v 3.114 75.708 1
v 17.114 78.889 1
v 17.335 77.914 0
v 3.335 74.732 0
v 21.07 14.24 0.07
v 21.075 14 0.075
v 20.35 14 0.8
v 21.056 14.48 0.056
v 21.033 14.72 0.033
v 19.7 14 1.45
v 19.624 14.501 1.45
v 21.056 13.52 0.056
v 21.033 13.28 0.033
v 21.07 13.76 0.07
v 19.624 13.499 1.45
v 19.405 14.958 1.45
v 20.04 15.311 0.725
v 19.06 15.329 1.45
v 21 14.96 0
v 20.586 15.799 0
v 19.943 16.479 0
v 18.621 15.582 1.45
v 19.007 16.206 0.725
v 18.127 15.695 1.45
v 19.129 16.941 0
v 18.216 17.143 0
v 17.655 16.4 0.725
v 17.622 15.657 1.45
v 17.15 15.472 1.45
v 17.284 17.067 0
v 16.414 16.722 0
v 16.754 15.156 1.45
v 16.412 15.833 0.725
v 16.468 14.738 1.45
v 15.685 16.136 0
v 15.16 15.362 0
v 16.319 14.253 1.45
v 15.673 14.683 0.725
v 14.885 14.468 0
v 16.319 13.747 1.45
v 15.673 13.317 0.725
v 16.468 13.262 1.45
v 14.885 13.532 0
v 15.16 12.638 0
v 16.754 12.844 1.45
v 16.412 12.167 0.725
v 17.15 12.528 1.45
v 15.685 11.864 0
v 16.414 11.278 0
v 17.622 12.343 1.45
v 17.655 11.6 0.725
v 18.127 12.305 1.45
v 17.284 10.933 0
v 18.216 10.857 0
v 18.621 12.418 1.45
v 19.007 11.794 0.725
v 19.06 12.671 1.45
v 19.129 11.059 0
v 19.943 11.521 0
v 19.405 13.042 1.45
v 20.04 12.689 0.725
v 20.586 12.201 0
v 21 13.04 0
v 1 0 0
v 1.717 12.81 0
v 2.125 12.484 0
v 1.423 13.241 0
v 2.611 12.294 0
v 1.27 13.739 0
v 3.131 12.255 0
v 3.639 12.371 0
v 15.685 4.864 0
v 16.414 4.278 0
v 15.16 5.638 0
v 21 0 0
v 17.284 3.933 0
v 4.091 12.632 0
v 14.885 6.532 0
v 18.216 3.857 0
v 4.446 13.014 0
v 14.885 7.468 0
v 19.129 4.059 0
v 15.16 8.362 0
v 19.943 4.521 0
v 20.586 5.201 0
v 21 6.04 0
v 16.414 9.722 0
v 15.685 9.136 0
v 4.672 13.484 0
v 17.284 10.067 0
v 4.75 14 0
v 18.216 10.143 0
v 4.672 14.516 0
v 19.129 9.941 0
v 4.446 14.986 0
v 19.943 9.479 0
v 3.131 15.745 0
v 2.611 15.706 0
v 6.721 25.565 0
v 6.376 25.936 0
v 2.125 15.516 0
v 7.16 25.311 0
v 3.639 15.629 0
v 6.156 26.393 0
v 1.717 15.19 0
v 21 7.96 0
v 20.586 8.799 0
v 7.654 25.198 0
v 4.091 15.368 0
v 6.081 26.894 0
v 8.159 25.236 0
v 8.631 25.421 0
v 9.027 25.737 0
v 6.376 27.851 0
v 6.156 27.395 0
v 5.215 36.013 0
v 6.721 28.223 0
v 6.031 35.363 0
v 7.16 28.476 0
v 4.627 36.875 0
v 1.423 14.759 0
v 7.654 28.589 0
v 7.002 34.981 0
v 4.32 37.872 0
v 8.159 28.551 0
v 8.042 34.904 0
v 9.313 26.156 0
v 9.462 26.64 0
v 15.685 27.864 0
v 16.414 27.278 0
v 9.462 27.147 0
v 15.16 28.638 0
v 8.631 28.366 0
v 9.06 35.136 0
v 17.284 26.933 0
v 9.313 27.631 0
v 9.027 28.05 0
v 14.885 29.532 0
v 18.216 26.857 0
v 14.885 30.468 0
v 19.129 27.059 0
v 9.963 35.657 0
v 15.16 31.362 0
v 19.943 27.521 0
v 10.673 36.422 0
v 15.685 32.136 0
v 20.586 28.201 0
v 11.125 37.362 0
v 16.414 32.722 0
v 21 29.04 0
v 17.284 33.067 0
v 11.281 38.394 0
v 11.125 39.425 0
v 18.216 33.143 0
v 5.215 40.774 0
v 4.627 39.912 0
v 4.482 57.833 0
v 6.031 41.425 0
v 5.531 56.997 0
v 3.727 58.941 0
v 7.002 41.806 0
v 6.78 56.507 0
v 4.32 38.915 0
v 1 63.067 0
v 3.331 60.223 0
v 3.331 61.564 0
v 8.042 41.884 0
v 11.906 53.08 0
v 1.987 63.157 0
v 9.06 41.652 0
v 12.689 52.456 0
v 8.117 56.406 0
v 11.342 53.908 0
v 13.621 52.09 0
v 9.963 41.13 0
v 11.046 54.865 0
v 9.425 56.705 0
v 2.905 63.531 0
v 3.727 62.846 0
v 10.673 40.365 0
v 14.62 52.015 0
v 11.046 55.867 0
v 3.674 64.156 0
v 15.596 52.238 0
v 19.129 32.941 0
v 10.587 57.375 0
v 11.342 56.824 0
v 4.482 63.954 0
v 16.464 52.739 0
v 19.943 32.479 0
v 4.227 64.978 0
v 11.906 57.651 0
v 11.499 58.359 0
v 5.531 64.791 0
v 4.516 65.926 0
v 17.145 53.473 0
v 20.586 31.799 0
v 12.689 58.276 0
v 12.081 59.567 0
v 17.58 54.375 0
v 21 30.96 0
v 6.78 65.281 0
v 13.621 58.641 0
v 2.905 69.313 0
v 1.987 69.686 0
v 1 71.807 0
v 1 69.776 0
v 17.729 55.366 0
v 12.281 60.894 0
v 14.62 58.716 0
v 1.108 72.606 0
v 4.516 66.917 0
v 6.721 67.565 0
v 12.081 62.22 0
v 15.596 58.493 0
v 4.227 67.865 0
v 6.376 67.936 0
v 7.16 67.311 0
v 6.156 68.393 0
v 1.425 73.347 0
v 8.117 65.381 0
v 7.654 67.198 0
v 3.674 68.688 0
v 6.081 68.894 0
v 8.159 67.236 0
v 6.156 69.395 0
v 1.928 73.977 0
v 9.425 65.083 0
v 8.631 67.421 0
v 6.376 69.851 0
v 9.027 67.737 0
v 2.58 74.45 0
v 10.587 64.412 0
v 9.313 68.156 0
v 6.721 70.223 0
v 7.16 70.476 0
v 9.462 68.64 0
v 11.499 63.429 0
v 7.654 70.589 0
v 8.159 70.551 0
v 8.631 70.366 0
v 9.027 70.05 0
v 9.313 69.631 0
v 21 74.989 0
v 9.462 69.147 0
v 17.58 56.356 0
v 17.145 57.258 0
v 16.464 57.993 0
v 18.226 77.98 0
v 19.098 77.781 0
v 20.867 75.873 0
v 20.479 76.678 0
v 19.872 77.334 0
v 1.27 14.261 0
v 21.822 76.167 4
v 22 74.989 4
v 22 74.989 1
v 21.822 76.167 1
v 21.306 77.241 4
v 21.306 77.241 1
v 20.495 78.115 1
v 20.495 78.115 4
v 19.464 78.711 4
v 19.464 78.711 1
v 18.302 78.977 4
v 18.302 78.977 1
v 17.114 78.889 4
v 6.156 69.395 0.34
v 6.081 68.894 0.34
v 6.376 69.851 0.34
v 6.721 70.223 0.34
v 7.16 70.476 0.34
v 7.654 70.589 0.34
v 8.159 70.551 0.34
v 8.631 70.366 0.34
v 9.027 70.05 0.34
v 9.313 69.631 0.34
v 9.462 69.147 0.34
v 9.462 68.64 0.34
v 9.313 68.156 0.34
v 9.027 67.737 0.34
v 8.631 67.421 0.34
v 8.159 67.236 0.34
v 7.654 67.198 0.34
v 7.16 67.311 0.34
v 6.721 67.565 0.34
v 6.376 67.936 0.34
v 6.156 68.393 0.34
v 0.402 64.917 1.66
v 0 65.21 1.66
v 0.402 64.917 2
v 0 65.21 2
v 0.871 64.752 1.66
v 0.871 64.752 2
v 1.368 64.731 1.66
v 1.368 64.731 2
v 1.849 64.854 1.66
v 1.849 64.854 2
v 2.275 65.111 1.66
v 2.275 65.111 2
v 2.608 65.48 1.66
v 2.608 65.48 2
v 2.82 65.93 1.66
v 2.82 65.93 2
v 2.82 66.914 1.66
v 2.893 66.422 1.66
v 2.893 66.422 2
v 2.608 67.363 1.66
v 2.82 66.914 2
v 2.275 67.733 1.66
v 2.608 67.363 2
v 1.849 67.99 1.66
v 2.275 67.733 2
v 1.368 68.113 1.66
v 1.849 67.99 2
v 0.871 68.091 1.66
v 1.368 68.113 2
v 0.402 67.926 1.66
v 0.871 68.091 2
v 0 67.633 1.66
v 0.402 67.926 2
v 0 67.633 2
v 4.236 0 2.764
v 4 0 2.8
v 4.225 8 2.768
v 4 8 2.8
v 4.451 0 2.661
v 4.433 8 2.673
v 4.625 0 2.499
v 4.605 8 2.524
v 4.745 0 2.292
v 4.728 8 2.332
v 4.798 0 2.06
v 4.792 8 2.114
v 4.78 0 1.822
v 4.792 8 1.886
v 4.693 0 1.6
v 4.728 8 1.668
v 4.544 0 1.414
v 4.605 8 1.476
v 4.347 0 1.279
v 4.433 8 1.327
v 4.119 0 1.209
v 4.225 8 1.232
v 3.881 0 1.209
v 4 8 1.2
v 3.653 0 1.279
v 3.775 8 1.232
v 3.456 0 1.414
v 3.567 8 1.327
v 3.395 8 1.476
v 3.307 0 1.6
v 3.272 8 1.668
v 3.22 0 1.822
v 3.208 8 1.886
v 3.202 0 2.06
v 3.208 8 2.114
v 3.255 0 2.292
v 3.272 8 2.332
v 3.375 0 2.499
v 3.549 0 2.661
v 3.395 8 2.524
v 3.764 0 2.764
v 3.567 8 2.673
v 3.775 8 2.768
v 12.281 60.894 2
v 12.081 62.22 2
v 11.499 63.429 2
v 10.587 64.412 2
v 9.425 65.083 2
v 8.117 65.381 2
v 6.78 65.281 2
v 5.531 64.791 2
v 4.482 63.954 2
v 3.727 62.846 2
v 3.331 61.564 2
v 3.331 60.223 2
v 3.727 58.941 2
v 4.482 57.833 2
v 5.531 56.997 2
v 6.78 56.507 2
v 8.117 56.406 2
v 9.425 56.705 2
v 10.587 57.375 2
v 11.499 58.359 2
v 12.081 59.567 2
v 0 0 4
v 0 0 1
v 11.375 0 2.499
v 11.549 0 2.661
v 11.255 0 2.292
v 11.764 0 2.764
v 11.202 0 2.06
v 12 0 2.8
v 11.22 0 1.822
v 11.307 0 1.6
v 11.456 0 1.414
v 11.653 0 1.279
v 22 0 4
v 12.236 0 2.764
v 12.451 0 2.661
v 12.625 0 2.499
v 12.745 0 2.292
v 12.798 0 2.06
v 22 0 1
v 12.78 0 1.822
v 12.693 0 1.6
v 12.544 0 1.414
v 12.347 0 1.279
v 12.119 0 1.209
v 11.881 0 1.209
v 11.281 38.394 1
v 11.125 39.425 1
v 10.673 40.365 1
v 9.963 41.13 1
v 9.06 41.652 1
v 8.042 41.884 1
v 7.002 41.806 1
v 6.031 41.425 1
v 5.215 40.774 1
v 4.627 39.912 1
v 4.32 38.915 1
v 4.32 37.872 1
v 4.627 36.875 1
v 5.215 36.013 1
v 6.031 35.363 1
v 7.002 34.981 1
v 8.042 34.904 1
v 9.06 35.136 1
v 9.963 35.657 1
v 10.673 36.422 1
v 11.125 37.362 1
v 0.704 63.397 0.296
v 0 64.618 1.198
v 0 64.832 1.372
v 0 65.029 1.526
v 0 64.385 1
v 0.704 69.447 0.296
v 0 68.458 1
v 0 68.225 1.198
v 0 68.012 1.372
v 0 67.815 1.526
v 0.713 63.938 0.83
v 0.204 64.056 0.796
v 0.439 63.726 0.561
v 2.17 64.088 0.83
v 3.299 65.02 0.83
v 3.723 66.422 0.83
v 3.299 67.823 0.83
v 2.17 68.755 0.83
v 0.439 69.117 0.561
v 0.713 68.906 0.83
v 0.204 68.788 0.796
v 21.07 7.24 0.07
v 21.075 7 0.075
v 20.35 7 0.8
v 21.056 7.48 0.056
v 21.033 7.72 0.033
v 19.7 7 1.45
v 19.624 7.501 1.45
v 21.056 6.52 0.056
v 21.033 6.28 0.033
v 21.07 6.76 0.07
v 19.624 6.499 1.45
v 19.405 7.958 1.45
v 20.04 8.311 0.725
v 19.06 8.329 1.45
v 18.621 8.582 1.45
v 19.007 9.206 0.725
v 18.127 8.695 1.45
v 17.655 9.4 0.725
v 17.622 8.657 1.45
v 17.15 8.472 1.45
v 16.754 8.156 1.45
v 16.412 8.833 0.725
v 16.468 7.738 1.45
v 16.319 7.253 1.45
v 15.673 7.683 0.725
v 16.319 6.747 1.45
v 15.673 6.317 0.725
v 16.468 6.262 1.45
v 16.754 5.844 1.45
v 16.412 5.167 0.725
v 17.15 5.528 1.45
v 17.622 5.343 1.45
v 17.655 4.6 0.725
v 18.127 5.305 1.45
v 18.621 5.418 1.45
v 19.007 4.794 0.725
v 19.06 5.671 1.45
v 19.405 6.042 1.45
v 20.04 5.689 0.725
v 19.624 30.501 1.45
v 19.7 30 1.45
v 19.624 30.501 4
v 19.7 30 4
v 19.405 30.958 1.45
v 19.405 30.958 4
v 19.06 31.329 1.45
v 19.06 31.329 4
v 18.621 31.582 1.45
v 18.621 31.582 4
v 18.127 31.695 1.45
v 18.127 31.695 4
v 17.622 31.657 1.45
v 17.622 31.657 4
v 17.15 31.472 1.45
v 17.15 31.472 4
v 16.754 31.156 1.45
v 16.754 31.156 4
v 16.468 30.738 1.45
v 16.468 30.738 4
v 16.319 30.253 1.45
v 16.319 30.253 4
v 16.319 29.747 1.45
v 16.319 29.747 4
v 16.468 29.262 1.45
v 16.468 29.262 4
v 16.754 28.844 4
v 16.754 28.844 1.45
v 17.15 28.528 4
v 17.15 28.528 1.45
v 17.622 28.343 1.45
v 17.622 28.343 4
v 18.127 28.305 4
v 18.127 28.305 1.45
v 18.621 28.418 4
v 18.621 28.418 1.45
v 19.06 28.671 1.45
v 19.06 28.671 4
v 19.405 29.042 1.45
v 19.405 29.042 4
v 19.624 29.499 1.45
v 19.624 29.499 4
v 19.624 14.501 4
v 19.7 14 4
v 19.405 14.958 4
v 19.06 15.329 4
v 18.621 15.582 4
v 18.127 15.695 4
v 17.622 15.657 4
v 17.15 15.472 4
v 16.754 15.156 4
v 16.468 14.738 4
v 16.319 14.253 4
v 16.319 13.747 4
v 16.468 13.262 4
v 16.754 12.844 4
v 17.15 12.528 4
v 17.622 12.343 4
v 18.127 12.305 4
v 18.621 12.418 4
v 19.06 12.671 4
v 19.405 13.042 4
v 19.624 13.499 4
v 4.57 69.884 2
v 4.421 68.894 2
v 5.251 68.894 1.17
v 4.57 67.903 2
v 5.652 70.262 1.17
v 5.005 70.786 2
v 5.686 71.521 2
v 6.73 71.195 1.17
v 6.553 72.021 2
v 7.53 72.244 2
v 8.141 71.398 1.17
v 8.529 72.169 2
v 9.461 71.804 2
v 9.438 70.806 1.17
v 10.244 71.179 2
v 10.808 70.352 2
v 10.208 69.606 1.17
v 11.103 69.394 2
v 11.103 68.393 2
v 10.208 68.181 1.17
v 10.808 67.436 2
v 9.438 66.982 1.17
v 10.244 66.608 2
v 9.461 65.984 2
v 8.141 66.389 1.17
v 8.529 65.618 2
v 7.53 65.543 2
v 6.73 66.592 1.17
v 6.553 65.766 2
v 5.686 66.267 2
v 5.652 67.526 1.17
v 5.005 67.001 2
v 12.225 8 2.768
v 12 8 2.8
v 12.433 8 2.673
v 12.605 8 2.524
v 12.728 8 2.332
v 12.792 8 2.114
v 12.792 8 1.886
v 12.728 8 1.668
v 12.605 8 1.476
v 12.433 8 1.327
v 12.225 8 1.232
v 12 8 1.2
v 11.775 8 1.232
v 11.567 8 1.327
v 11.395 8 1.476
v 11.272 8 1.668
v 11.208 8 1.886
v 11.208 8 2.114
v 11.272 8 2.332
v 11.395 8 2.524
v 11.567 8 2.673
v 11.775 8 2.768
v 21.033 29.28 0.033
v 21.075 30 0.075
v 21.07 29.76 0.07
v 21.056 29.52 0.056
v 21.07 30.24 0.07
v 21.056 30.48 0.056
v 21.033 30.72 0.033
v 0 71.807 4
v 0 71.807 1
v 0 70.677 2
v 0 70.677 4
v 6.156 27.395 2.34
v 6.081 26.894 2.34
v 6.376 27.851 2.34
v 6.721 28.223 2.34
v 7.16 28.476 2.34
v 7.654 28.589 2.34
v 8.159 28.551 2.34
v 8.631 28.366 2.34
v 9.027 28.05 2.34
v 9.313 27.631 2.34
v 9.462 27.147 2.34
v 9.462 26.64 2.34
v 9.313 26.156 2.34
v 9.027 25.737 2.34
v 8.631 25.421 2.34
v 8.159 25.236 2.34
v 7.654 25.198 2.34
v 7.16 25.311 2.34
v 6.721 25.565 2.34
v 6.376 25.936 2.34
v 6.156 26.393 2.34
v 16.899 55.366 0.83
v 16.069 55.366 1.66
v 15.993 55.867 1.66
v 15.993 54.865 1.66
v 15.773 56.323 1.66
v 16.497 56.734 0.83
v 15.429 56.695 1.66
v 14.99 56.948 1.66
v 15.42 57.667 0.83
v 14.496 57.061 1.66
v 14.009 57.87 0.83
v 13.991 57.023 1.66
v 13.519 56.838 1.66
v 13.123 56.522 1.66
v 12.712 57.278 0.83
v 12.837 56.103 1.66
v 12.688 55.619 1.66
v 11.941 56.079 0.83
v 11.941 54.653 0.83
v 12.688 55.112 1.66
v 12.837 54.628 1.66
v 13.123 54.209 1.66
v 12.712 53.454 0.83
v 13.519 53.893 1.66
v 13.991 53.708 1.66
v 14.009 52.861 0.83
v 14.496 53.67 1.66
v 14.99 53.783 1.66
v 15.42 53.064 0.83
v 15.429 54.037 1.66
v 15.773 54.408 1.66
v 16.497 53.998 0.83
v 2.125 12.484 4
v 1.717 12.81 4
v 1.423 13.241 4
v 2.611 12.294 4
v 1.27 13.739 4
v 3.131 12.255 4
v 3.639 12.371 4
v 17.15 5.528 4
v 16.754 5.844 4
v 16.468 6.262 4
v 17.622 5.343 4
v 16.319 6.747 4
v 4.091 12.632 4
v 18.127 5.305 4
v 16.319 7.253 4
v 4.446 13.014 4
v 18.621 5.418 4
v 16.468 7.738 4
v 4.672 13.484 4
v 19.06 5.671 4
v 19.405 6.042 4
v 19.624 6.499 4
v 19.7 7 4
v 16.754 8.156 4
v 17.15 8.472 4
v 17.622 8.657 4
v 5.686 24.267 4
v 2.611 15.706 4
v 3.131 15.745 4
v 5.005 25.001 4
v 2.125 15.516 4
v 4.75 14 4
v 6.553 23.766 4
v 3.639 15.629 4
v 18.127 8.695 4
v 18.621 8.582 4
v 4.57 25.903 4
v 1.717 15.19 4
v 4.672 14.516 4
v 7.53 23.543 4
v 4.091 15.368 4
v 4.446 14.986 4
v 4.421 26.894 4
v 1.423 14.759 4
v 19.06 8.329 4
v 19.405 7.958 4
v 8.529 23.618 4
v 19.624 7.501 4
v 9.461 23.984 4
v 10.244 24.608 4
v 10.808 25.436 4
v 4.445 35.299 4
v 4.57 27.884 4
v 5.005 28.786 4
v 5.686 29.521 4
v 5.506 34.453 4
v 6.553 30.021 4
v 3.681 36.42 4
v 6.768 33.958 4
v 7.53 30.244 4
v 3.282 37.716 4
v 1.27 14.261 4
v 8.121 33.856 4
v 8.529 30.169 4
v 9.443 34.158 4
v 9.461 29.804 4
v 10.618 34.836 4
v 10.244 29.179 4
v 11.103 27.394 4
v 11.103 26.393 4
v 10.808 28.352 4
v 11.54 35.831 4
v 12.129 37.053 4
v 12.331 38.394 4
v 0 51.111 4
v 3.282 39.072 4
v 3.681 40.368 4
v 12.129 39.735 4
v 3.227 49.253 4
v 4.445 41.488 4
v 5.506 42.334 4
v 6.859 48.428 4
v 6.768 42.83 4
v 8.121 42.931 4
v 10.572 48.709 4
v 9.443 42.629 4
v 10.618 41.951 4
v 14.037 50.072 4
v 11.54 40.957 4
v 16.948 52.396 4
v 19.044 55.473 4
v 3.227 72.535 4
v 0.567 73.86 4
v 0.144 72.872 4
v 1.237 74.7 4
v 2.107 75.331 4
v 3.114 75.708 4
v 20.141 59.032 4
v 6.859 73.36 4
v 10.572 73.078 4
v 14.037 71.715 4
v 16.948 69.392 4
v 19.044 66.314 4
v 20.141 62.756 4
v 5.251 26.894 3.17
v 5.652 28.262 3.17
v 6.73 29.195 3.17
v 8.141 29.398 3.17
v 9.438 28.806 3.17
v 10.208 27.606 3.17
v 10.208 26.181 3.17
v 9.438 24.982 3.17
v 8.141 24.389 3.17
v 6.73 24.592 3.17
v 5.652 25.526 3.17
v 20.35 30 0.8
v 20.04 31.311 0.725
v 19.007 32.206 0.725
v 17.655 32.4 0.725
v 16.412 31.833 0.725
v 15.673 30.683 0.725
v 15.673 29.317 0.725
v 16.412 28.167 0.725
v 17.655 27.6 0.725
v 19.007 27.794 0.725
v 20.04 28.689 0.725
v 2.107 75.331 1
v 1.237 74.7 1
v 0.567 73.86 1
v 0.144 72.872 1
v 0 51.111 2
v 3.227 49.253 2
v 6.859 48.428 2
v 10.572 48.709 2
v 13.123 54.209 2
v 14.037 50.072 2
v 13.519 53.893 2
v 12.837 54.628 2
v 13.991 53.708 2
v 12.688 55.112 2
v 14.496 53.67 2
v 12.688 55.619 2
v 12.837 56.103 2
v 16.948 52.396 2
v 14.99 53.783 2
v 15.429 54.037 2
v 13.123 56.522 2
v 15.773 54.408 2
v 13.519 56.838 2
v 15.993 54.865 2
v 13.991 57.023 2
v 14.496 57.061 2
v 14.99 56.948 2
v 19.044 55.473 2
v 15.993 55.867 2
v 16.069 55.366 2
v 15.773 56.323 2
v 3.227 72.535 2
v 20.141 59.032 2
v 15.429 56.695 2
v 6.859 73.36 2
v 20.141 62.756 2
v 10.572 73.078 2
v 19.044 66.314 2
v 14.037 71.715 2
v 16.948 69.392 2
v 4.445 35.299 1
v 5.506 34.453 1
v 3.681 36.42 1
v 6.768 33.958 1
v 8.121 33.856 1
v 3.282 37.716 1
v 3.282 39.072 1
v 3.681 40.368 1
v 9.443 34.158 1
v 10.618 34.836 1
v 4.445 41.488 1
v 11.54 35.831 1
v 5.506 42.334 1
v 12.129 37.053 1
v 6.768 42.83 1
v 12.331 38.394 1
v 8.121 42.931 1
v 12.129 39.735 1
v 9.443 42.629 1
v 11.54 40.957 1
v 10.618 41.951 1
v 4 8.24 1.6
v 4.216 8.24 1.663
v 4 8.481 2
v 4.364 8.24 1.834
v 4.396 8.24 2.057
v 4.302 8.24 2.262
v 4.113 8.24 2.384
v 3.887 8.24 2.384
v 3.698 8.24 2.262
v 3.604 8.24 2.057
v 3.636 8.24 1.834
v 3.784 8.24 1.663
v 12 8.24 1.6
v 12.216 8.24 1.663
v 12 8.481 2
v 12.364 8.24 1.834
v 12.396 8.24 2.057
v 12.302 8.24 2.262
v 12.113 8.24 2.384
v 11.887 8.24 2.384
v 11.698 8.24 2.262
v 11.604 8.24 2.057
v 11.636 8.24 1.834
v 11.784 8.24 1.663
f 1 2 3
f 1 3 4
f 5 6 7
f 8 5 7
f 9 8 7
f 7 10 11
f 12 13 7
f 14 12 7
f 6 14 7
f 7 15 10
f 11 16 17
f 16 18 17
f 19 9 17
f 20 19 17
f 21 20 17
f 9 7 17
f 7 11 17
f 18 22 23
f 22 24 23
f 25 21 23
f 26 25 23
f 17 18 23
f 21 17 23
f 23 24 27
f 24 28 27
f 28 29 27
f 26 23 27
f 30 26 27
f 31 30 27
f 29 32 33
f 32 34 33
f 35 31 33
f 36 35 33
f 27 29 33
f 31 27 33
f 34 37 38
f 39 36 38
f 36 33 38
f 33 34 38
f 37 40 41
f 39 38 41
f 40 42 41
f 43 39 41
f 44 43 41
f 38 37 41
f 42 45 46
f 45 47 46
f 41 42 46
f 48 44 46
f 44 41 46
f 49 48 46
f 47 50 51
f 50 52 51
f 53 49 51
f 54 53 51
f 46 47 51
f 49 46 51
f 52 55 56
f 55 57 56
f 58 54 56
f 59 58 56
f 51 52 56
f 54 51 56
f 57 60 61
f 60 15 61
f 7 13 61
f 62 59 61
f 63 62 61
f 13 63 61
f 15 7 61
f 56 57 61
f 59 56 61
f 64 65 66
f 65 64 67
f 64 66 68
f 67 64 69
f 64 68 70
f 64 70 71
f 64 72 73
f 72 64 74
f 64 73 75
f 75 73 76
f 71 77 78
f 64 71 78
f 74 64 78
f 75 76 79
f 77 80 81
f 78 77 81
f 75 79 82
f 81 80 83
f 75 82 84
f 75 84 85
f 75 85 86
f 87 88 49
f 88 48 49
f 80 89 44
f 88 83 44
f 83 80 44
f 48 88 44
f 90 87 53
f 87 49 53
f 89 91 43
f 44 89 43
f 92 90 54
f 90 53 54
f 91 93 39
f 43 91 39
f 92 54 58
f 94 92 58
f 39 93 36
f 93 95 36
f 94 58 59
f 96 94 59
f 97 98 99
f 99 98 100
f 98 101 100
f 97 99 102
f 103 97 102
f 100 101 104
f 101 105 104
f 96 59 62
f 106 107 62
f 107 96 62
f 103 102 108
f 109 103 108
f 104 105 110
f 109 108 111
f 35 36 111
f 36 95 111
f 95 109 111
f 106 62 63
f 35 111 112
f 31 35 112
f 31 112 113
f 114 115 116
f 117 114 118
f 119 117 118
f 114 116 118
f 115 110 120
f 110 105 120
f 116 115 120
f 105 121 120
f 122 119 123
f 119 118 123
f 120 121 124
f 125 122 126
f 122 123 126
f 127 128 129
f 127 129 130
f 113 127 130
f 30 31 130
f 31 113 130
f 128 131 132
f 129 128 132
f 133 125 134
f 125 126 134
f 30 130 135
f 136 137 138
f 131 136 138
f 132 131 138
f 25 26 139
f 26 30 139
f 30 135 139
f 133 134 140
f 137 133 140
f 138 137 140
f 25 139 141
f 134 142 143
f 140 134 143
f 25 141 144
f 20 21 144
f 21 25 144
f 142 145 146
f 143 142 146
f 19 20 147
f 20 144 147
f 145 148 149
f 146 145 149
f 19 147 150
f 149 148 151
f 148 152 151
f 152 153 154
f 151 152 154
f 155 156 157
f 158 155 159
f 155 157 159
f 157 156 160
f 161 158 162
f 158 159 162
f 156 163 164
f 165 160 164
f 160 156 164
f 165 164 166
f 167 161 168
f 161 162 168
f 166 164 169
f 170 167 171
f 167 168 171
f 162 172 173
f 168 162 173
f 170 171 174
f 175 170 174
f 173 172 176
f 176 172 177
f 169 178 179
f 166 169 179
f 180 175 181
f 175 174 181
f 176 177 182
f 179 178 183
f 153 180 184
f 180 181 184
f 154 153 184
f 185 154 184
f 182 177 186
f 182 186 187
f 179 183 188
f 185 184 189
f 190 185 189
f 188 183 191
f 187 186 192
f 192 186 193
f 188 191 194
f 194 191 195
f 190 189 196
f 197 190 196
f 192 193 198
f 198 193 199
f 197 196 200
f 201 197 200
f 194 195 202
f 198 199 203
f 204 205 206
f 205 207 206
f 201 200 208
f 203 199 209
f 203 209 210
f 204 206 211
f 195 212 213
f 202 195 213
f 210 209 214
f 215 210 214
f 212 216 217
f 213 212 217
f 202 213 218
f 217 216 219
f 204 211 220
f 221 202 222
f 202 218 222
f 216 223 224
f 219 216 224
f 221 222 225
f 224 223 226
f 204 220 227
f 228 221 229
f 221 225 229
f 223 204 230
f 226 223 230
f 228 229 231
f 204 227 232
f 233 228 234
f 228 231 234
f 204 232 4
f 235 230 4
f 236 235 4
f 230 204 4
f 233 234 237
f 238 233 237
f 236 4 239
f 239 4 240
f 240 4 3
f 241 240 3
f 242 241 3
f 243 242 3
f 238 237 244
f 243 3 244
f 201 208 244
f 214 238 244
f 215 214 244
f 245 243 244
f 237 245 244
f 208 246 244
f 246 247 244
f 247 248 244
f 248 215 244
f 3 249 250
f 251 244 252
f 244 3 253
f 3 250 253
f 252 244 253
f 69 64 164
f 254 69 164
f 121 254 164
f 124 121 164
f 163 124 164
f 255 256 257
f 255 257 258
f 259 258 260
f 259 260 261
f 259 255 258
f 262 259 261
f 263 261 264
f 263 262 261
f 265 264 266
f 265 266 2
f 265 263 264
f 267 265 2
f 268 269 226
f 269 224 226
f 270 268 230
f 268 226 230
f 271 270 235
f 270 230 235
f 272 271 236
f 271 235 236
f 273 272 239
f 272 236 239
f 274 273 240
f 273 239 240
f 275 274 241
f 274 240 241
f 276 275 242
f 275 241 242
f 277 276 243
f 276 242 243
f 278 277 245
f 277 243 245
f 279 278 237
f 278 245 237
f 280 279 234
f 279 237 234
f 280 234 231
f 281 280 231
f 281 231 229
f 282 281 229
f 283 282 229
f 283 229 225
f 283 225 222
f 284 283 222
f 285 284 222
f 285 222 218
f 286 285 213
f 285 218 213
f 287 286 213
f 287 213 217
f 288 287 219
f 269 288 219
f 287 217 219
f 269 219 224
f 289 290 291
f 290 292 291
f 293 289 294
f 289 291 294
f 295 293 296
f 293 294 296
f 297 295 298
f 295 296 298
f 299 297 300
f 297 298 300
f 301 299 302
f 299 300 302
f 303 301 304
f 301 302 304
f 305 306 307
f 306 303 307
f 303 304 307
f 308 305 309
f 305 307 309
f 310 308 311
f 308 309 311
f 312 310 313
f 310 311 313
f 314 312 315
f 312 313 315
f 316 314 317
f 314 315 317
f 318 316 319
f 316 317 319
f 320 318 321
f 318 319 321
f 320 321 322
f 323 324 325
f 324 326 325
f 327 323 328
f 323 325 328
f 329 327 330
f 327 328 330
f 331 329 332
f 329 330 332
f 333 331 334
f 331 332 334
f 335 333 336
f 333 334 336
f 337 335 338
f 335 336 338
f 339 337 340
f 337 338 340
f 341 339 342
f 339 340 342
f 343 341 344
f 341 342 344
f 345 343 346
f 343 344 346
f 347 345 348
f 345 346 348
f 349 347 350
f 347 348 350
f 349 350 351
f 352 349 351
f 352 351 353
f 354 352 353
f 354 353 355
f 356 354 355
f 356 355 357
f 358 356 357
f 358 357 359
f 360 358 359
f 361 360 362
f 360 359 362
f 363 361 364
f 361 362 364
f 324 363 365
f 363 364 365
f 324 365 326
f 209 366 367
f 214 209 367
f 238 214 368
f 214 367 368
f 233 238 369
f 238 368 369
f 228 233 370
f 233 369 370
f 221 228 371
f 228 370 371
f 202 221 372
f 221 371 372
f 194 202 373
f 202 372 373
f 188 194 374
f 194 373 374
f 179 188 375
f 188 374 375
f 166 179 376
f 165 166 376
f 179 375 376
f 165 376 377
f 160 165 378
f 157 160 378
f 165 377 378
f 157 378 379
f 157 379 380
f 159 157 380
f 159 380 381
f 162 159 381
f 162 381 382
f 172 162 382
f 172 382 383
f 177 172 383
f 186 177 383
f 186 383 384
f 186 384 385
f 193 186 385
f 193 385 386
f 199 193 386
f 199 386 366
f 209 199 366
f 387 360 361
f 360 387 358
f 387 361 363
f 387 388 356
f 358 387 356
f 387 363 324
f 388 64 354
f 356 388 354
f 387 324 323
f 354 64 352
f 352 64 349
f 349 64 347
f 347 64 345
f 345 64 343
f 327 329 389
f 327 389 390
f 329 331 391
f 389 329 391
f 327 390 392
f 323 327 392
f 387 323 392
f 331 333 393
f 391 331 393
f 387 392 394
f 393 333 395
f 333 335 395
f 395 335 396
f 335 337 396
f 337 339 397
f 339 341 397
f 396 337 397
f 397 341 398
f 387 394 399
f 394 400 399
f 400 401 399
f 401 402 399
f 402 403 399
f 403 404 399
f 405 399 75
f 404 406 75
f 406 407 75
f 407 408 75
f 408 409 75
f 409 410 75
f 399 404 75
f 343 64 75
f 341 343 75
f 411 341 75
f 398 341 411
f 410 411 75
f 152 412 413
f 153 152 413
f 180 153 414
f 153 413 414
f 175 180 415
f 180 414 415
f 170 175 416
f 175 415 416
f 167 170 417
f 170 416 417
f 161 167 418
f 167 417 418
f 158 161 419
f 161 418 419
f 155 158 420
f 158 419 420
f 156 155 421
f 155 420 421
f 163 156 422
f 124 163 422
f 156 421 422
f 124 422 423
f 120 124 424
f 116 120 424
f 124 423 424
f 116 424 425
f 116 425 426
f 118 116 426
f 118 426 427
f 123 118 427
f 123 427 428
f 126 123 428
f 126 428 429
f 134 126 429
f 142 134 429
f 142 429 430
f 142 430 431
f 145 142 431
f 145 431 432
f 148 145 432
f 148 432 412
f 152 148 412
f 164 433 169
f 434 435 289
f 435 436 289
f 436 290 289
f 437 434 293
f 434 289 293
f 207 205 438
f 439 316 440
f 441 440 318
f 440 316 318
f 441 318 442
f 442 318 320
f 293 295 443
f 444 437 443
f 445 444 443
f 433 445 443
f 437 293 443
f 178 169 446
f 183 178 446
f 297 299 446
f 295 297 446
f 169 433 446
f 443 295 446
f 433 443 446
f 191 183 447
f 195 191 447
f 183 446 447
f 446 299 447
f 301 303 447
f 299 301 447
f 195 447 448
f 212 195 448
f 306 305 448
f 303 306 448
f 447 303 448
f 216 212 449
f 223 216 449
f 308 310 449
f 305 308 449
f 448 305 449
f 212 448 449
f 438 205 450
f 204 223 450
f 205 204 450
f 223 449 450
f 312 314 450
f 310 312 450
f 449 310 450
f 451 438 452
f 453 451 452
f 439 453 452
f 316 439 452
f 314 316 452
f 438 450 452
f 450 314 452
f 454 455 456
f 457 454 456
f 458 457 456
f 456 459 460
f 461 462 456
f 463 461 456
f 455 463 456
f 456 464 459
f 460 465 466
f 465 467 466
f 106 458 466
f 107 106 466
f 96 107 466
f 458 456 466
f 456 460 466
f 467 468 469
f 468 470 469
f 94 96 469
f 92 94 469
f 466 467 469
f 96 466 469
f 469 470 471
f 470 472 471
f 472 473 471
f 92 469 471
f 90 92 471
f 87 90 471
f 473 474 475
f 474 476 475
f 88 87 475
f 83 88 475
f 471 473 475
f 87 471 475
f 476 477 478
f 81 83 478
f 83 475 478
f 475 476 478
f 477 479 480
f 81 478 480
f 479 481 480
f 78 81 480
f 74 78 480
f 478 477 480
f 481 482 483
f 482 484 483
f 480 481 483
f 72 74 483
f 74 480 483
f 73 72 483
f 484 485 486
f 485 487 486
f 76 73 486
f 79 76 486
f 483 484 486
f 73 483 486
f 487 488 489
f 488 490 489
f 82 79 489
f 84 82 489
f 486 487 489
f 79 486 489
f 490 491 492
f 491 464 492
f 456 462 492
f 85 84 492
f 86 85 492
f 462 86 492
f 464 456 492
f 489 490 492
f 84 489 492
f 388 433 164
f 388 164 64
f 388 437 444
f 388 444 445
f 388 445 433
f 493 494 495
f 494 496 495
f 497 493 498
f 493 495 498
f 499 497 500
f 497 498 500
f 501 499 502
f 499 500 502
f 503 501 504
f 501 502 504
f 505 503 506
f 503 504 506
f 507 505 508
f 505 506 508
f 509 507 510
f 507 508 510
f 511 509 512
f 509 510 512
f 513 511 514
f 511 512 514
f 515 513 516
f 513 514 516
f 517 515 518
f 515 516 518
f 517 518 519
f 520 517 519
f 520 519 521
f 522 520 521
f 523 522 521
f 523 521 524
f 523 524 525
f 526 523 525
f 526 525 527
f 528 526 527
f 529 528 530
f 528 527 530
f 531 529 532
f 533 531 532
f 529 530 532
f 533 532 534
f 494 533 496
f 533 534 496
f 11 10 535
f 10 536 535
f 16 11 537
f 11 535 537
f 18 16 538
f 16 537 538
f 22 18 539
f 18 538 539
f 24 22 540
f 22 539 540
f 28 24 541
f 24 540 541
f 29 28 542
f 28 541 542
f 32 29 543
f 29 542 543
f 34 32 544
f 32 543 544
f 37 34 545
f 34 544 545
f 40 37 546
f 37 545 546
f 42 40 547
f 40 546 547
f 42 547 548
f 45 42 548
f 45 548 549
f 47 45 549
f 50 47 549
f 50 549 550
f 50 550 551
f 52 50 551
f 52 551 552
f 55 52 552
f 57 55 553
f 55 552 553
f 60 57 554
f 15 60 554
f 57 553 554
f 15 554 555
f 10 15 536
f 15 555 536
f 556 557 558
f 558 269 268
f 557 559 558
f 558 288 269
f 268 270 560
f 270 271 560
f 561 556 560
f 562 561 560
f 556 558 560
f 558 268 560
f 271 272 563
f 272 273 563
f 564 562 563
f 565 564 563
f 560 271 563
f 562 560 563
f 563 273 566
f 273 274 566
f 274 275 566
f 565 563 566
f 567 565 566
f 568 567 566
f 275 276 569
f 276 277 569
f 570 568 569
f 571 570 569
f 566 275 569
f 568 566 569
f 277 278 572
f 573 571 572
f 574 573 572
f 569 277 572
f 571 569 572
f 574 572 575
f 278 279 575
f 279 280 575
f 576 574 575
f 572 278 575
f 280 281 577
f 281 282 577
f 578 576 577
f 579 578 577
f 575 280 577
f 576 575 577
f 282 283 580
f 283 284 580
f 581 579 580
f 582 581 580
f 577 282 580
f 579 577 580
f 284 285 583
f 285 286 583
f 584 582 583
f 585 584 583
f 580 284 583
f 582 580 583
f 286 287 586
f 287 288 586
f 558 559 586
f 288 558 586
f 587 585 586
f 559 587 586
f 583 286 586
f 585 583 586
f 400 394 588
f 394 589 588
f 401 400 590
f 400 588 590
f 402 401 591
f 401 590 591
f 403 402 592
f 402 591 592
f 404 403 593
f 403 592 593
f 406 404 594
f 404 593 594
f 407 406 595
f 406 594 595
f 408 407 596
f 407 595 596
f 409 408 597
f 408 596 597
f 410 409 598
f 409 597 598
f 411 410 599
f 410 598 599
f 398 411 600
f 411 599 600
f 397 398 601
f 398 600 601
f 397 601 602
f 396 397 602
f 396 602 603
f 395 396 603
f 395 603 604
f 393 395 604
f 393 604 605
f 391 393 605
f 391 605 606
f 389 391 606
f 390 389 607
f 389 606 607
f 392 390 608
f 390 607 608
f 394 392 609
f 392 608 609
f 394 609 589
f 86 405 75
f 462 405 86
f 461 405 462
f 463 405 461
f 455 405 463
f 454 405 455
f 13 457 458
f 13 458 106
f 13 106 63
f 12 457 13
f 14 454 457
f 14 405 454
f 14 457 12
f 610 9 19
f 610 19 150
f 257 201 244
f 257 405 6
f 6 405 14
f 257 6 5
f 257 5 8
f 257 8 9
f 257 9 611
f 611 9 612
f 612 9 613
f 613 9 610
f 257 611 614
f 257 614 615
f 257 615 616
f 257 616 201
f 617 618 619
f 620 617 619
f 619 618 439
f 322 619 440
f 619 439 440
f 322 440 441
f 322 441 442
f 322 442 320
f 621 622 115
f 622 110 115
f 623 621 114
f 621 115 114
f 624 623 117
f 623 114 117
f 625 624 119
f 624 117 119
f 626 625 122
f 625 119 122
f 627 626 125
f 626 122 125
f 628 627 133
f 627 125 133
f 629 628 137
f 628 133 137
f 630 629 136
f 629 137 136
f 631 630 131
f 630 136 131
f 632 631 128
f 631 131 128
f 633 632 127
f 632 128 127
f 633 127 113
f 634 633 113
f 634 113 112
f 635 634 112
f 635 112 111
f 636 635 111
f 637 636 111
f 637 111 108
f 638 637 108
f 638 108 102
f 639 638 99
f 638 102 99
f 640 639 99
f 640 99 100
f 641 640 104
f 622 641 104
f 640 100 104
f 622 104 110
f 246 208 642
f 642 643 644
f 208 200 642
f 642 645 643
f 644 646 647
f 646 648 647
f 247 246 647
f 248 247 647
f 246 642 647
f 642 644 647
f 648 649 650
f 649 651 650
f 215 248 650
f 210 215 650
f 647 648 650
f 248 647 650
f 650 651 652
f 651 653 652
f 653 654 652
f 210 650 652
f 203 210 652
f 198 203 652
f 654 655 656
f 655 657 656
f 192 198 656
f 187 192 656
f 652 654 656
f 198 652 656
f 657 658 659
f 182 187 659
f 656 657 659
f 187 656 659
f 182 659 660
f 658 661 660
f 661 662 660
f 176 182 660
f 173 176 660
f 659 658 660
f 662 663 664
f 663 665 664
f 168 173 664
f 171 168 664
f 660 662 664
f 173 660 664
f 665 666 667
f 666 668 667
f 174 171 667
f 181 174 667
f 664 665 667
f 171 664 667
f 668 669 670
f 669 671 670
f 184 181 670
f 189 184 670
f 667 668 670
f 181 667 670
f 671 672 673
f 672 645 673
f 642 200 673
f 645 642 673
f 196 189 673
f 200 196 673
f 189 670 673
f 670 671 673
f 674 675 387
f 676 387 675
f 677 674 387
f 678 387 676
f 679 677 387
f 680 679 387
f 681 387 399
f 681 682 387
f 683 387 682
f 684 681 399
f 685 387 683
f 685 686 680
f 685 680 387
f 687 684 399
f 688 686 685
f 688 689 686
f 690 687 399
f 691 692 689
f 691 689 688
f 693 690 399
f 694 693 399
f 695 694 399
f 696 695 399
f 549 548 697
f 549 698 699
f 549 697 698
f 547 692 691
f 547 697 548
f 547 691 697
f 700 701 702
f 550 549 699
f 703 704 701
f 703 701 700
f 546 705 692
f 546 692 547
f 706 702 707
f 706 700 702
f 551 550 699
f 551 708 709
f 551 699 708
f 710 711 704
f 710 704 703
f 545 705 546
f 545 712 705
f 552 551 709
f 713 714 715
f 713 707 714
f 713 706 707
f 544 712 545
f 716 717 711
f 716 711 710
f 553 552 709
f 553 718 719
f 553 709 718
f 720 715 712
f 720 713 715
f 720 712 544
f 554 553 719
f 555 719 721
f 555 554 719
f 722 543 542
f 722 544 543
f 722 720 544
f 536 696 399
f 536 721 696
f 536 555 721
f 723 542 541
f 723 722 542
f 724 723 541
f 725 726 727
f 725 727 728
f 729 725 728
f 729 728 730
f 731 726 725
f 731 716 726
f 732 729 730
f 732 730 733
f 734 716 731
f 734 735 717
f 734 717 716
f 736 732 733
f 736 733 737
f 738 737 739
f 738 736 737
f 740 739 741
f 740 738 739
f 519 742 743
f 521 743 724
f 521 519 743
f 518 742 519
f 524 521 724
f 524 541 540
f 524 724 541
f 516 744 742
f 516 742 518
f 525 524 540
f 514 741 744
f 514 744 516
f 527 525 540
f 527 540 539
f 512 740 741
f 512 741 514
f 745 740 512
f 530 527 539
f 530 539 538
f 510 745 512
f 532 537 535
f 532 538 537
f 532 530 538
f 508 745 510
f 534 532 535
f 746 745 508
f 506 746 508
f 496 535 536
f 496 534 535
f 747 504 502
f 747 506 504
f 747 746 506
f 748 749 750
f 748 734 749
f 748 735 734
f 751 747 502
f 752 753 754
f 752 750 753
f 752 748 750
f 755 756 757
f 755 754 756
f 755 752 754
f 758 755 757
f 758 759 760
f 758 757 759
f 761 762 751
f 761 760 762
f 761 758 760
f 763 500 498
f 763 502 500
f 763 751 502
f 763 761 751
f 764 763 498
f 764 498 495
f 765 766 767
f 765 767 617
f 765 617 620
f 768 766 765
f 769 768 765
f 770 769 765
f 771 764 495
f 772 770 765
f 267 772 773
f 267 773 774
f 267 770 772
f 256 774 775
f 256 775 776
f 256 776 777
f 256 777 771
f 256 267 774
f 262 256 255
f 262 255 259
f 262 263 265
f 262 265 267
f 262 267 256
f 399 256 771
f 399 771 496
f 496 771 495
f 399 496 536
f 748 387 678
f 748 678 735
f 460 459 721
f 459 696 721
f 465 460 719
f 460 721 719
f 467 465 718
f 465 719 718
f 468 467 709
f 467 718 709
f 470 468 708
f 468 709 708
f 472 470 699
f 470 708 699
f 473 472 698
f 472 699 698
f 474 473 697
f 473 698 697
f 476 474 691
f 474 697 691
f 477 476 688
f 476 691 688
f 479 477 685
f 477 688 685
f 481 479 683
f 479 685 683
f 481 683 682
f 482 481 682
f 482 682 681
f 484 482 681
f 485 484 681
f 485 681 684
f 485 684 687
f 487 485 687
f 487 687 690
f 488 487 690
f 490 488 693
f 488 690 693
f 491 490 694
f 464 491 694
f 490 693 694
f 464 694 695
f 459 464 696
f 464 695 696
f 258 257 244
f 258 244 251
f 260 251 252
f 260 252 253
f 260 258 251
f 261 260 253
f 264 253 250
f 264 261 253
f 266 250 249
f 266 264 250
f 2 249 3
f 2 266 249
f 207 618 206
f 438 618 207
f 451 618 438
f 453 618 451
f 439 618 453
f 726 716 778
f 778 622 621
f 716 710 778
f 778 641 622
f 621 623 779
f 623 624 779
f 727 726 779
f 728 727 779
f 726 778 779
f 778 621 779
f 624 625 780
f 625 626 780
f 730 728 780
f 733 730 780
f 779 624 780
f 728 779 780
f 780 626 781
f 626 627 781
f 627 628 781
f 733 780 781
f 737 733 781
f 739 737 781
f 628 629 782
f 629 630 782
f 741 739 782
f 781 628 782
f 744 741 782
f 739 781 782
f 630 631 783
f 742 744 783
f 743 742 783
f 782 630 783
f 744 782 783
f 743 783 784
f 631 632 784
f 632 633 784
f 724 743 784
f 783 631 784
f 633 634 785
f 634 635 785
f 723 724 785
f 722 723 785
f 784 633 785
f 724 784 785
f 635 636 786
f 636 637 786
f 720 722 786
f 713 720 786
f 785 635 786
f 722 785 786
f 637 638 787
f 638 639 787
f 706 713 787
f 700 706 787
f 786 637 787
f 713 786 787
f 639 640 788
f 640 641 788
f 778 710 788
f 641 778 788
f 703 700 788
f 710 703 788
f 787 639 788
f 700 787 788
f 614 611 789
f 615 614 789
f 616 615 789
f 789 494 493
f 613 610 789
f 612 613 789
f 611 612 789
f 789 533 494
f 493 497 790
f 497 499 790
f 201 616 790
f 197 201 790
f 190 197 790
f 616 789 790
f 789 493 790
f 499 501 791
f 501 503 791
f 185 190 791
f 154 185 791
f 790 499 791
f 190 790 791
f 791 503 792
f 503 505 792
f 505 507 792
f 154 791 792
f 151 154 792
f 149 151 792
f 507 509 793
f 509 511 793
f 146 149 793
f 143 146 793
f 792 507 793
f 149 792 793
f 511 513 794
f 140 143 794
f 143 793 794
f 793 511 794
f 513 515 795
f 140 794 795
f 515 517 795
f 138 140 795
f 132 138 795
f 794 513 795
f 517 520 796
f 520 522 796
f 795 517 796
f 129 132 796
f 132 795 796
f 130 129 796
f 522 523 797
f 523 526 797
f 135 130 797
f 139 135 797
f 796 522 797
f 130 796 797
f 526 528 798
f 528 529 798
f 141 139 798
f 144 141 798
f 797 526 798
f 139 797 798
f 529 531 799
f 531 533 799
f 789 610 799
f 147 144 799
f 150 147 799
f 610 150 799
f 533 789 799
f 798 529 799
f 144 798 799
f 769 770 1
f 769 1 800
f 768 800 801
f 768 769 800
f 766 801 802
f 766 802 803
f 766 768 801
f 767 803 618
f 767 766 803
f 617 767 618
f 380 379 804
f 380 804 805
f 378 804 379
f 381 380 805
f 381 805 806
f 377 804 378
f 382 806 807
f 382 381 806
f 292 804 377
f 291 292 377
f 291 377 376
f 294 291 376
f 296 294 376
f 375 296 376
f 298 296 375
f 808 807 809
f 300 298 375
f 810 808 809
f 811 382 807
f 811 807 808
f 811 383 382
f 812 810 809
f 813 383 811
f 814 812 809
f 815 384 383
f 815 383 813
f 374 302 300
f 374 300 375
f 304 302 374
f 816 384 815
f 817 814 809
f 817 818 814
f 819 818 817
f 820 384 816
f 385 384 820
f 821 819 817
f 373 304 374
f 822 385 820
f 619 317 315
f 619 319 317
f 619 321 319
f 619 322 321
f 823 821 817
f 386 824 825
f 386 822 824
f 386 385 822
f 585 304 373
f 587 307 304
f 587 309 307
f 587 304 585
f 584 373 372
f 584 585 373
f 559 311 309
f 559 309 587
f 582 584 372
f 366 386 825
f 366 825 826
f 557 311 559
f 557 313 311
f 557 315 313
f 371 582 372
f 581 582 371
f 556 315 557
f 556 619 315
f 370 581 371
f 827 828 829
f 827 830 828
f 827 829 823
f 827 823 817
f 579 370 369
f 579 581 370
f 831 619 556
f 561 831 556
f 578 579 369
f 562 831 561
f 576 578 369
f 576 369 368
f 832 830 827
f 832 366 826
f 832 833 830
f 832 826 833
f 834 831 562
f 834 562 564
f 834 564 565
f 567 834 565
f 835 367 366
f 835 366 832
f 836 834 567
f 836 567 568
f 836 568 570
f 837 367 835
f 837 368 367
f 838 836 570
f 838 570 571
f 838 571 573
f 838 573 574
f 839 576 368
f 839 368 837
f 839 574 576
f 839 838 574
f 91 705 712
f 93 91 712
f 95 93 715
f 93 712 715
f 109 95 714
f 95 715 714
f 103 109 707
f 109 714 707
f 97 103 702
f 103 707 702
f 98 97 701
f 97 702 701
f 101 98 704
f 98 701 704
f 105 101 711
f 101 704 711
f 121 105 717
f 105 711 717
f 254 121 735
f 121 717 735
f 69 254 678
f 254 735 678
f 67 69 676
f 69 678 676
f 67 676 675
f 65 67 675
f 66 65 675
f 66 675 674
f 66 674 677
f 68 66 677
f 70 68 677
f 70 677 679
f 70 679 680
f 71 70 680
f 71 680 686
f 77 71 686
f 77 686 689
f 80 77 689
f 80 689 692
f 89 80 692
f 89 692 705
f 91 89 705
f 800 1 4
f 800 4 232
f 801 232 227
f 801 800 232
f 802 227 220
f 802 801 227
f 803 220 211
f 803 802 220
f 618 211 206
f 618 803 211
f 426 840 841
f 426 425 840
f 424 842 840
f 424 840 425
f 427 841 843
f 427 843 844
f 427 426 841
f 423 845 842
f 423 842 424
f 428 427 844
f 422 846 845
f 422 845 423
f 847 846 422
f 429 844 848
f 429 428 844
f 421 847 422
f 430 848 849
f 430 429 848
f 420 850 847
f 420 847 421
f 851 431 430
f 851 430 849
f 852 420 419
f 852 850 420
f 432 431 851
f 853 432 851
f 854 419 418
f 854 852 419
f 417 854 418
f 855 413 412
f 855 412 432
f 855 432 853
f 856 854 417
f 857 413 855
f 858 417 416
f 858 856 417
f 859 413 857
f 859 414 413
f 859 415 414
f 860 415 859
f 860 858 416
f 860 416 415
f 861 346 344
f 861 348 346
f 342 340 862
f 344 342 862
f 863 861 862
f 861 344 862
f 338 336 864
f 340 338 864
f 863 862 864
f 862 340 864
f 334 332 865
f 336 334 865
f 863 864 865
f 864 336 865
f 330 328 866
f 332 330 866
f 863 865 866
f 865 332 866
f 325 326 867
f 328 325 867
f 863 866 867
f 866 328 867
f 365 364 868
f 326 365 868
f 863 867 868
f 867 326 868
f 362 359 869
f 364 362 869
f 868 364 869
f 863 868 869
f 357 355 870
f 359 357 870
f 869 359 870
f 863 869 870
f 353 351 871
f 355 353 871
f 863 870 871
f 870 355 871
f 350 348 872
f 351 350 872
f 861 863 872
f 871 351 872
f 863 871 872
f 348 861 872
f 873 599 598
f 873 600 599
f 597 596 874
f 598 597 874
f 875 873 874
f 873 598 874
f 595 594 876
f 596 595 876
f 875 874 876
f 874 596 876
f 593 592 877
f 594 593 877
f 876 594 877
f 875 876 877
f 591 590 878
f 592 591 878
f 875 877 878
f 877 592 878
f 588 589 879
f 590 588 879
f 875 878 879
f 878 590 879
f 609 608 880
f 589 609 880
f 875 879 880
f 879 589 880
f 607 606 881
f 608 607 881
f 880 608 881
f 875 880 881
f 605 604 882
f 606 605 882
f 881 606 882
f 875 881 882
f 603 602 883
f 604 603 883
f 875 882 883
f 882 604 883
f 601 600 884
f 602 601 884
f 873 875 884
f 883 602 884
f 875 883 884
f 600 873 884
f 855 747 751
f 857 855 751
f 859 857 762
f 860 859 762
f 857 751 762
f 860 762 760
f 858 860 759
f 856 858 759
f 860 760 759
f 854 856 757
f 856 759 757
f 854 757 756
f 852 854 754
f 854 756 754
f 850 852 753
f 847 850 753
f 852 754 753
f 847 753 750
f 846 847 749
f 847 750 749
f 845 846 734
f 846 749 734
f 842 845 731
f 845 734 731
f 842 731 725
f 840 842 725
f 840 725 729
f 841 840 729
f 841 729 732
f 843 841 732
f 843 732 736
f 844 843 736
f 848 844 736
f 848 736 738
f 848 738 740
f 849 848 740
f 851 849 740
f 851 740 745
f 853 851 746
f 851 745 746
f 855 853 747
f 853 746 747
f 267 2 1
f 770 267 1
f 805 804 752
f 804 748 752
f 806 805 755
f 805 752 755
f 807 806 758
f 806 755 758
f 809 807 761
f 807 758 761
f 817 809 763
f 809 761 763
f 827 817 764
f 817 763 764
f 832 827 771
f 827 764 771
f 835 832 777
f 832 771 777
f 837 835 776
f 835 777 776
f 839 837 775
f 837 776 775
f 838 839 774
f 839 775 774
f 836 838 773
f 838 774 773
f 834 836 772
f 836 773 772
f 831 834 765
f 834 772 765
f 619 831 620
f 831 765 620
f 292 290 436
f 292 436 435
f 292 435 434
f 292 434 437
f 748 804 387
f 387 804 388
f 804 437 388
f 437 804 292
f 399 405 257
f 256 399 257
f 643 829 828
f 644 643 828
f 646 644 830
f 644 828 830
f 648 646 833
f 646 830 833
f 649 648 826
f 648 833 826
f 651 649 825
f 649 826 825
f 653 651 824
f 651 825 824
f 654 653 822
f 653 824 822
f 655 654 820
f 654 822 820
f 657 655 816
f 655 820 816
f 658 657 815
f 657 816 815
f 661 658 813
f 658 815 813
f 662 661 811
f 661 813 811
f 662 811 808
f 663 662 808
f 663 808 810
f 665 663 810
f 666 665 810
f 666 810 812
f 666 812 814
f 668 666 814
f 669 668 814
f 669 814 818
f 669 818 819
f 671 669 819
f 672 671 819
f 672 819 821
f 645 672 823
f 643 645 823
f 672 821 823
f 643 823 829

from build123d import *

# Parameters (mm, degrees)
RESSALTO_EXTRUS_O1_DEPTH                             = 4
FILETE1_R                                            = 4
CHANFRO1_SIZE                                        = 1
FURO_DE_DI_METRO_7_0_7_1_D                           = 7
ESCAREADO_PARA_PARAFUSO_COM_CABE_A_ESCAR_D           = 3.4
ESCAREADO_PARA_PARAFUSO_COM_CABE_A_ESCAR_CSINK_D     = 6.3
ESCAREADO_PARA_PARAFUSO_COM_CABE_A_ESCAR_CSINK_ANGLE = 90
BROCA_DE_ROSQUEAR_PARA_TARRAXA_DE_M21_D              = 1.6
BROCA_DE_ROSQUEAR_PARA_TARRAXA_DE_M21_DEPTH          = 8
BROCA_DE_ROSQUEAR_PARA_TARRAXA_DE_M21_TIP            = 0.480688495
FURO_DE_DI_METRO_9_0_9_3_D                           = 9
ESCAREADO_PARA_PARAFUSO_ALLEN_SEXTAVADO_D            = 3.4
ESCAREADO_PARA_PARAFUSO_ALLEN_SEXTAVADO_CSINK_D      = 6.72
ESCAREADO_PARA_PARAFUSO_ALLEN_SEXTAVADO_CSINK_ANGLE  = 90
ESCAREADO_PARA_PARAFUSO_COM_CABE_A_E_2_D             = 3.4
ESCAREADO_PARA_PARAFUSO_COM_CABE_A_E_2_DEPTH         = 4
ESCAREADO_PARA_PARAFUSO_COM_CABE_A_E_2_CSINK_D       = 6.3
ESCAREADO_PARA_PARAFUSO_COM_CABE_A_E_2_CSINK_ANGLE   = 90
ESCAREADO_PARA_PARAFUSO_COM_CABE_A_E_2_TIP           = 1.021463052
ESBO_O12_R                                           = 4.55
CORTE_EXTRUS_O1_DEPTH                                = 3
FURO_DE_DI_METRO_3_5_3_5_1_D                         = 3.5
ESBO_O36_R                                           = 12.5
CORTE_EXTRUS_O4_DEPTH                                = 2
ESCAREADO_PARA_PARAFUSO_ALLEN_SEXTAV_2_D             = 3.4
ESCAREADO_PARA_PARAFUSO_ALLEN_SEXTAV_2_CSINK_D       = 6.72
ESCAREADO_PARA_PARAFUSO_ALLEN_SEXTAV_2_CSINK_ANGLE   = 90
ESCAREADO_PARA_PARAFUSO_ALLEN_SEXTAV_2_O_D           = 3.4
ESCAREADO_PARA_PARAFUSO_ALLEN_SEXTAV_2_O_CSINK_D     = 6.72
ESCAREADO_PARA_PARAFUSO_ALLEN_SEXTAV_2_O_CSINK_ANGLE = 90


with BuildPart() as part:
    # Esboço1 → Ressalto-extrusão1 (new body)
    with BuildSketch(Plane.XY):
        Polygon((0, 0), (22, 0), (22, 80), (0, 75), align=None)
    extrude(amount=RESSALTO_EXTRUS_O1_DEPTH)

    # Filete1
    filete1_edges = [part.edges().sort_by_distance(p)[0] for p in [
        (0, 75, 2),
        (22, 80, 2),
    ]]
    fillet(filete1_edges, radius=FILETE1_R)

    # Chanfro1
    chanfro1_edges = [part.edges().sort_by_distance(p)[0] for p in [
        (10.113515586, 77.298526269, 0),
        (0, 35.903542878, 0),
        (0.873825208, 74.302487761, 0),
        (20.495402006, 78.115078729, 0),
        (22, 37.494451969, 0),
    ]]
    chamfer(chanfro1_edges, length=CHANFRO1_SIZE)

    # Furo de diâmetro Ø7.0 (7)1 (through all)
    with Locations(Plane(origin=(7.780869527, 38.393713373, 0), x_dir=(-1, 0, 0), z_dir=(0, 0, -1))):
        with Locations((0, 0)):
            Hole(FURO_DE_DI_METRO_7_0_7_1_D / 2)

    # Escareado para parafuso com cabe_a escar (through all)
    with Locations(Plane(origin=(18, 7, 0), x_dir=(-1, 0, 0), z_dir=(0, 0, -1))):
        with Locations((0, 0), (0, 7)):
            CounterSinkHole(ESCAREADO_PARA_PARAFUSO_COM_CABE_A_ESCAR_D / 2, ESCAREADO_PARA_PARAFUSO_COM_CABE_A_ESCAR_CSINK_D / 2, counter_sink_angle=ESCAREADO_PARA_PARAFUSO_COM_CABE_A_ESCAR_CSINK_ANGLE)

    # Broca de rosquear para tarraxa de M21
    with Locations(Plane(origin=(4, 0, 2), x_dir=(0, 0, -1), z_dir=(0, -1, 0))):
        with Locations((0, 0), (0, 8)):
            Hole(BROCA_DE_ROSQUEAR_PARA_TARRAXA_DE_M21_D / 2, depth=BROCA_DE_ROSQUEAR_PARA_TARRAXA_DE_M21_DEPTH)
            with Locations((0, 0, -(BROCA_DE_ROSQUEAR_PARA_TARRAXA_DE_M21_DEPTH + BROCA_DE_ROSQUEAR_PARA_TARRAXA_DE_M21_TIP / 2))):  # 118° drill point
                Cone(0, BROCA_DE_ROSQUEAR_PARA_TARRAXA_DE_M21_D / 2, BROCA_DE_ROSQUEAR_PARA_TARRAXA_DE_M21_TIP, mode=Mode.SUBTRACT)

    # Furo de diâmetro Ø9.0 (9)3 (through all)
    with Locations(Plane(origin=(7.780869527, 60.893713373, 0), x_dir=(-1, 0, 0), z_dir=(0, 0, -1))):
        with Locations((0, 0)):
            Hole(FURO_DE_DI_METRO_9_0_9_3_D / 2)

    # Escareado para parafuso Allen sextavado (through all)
    with Locations(Plane(origin=(14.368851738, 55.36573993, 0), x_dir=(-1, 0, 0), z_dir=(0, 0, -1))):
        with Locations((0, 0), (13.175964422, 11.055946886)):
            CounterSinkHole(ESCAREADO_PARA_PARAFUSO_ALLEN_SEXTAVADO_D / 2, ESCAREADO_PARA_PARAFUSO_ALLEN_SEXTAVADO_CSINK_D / 2, counter_sink_angle=ESCAREADO_PARA_PARAFUSO_ALLEN_SEXTAVADO_CSINK_ANGLE)

    # Escareado para parafuso com cabe_a e 2
    with Locations(Plane(origin=(18, 30, 0), x_dir=(-1, 0, 0), z_dir=(0, 0, -1))):
        with Locations((0, 0)):
            CounterSinkHole(ESCAREADO_PARA_PARAFUSO_COM_CABE_A_E_2_D / 2, ESCAREADO_PARA_PARAFUSO_COM_CABE_A_E_2_CSINK_D / 2, depth=ESCAREADO_PARA_PARAFUSO_COM_CABE_A_E_2_DEPTH, counter_sink_angle=ESCAREADO_PARA_PARAFUSO_COM_CABE_A_E_2_CSINK_ANGLE)
            with Locations((0, 0, -(ESCAREADO_PARA_PARAFUSO_COM_CABE_A_E_2_DEPTH + ESCAREADO_PARA_PARAFUSO_COM_CABE_A_E_2_TIP / 2))):  # 118° drill point
                Cone(0, ESCAREADO_PARA_PARAFUSO_COM_CABE_A_E_2_D / 2, ESCAREADO_PARA_PARAFUSO_COM_CABE_A_E_2_TIP, mode=Mode.SUBTRACT)

    # Esboço12 → Corte-extrusão1 (cut)
    with BuildSketch(Plane.XY.offset(4)):
        with Locations((7.780869527, 38.393713373)):
            Circle(ESBO_O12_R)
    extrude(amount=-CORTE_EXTRUS_O1_DEPTH, mode=Mode.SUBTRACT)

    # Furo de diâmetro Ø3.5 (3.5)1 (through all)
    with Locations(Plane(origin=(3, 14, 0), x_dir=(-1, 0, 0), z_dir=(0, 0, -1))):
        with Locations((0, 0)):
            Hole(FURO_DE_DI_METRO_3_5_3_5_1_D / 2)

    # Esboço36 → Corte-extrusão4 (cut)
    with BuildSketch(Plane.XY.offset(4)):
        with Locations((7.780869527, 60.893713373)):
            Circle(ESBO_O36_R)
    extrude(amount=-CORTE_EXTRUS_O4_DEPTH, mode=Mode.SUBTRACT)

    # Escareado para parafuso Allen sextav 2 (through all)
    with Locations(Plane(origin=(7.780869527, 26.893713373, 4), x_dir=(1, 0, 0), z_dir=(0, 0, 1))):
        with Locations((0, 0)):
            CounterSinkHole(ESCAREADO_PARA_PARAFUSO_ALLEN_SEXTAV_2_D / 2, ESCAREADO_PARA_PARAFUSO_ALLEN_SEXTAV_2_CSINK_D / 2, counter_sink_angle=ESCAREADO_PARA_PARAFUSO_ALLEN_SEXTAV_2_CSINK_ANGLE)

    # Escareado para parafuso Allen sextav 2 o (through all)
    with Locations(Plane(origin=(7.780869527, 68.893713373, 2), x_dir=(1, 0, 0), z_dir=(0, 0, 1))):
        with Locations((0, 0)):
            CounterSinkHole(ESCAREADO_PARA_PARAFUSO_ALLEN_SEXTAV_2_O_D / 2, ESCAREADO_PARA_PARAFUSO_ALLEN_SEXTAV_2_O_CSINK_D / 2, counter_sink_angle=ESCAREADO_PARA_PARAFUSO_ALLEN_SEXTAV_2_O_CSINK_ANGLE)


solid = part.part
